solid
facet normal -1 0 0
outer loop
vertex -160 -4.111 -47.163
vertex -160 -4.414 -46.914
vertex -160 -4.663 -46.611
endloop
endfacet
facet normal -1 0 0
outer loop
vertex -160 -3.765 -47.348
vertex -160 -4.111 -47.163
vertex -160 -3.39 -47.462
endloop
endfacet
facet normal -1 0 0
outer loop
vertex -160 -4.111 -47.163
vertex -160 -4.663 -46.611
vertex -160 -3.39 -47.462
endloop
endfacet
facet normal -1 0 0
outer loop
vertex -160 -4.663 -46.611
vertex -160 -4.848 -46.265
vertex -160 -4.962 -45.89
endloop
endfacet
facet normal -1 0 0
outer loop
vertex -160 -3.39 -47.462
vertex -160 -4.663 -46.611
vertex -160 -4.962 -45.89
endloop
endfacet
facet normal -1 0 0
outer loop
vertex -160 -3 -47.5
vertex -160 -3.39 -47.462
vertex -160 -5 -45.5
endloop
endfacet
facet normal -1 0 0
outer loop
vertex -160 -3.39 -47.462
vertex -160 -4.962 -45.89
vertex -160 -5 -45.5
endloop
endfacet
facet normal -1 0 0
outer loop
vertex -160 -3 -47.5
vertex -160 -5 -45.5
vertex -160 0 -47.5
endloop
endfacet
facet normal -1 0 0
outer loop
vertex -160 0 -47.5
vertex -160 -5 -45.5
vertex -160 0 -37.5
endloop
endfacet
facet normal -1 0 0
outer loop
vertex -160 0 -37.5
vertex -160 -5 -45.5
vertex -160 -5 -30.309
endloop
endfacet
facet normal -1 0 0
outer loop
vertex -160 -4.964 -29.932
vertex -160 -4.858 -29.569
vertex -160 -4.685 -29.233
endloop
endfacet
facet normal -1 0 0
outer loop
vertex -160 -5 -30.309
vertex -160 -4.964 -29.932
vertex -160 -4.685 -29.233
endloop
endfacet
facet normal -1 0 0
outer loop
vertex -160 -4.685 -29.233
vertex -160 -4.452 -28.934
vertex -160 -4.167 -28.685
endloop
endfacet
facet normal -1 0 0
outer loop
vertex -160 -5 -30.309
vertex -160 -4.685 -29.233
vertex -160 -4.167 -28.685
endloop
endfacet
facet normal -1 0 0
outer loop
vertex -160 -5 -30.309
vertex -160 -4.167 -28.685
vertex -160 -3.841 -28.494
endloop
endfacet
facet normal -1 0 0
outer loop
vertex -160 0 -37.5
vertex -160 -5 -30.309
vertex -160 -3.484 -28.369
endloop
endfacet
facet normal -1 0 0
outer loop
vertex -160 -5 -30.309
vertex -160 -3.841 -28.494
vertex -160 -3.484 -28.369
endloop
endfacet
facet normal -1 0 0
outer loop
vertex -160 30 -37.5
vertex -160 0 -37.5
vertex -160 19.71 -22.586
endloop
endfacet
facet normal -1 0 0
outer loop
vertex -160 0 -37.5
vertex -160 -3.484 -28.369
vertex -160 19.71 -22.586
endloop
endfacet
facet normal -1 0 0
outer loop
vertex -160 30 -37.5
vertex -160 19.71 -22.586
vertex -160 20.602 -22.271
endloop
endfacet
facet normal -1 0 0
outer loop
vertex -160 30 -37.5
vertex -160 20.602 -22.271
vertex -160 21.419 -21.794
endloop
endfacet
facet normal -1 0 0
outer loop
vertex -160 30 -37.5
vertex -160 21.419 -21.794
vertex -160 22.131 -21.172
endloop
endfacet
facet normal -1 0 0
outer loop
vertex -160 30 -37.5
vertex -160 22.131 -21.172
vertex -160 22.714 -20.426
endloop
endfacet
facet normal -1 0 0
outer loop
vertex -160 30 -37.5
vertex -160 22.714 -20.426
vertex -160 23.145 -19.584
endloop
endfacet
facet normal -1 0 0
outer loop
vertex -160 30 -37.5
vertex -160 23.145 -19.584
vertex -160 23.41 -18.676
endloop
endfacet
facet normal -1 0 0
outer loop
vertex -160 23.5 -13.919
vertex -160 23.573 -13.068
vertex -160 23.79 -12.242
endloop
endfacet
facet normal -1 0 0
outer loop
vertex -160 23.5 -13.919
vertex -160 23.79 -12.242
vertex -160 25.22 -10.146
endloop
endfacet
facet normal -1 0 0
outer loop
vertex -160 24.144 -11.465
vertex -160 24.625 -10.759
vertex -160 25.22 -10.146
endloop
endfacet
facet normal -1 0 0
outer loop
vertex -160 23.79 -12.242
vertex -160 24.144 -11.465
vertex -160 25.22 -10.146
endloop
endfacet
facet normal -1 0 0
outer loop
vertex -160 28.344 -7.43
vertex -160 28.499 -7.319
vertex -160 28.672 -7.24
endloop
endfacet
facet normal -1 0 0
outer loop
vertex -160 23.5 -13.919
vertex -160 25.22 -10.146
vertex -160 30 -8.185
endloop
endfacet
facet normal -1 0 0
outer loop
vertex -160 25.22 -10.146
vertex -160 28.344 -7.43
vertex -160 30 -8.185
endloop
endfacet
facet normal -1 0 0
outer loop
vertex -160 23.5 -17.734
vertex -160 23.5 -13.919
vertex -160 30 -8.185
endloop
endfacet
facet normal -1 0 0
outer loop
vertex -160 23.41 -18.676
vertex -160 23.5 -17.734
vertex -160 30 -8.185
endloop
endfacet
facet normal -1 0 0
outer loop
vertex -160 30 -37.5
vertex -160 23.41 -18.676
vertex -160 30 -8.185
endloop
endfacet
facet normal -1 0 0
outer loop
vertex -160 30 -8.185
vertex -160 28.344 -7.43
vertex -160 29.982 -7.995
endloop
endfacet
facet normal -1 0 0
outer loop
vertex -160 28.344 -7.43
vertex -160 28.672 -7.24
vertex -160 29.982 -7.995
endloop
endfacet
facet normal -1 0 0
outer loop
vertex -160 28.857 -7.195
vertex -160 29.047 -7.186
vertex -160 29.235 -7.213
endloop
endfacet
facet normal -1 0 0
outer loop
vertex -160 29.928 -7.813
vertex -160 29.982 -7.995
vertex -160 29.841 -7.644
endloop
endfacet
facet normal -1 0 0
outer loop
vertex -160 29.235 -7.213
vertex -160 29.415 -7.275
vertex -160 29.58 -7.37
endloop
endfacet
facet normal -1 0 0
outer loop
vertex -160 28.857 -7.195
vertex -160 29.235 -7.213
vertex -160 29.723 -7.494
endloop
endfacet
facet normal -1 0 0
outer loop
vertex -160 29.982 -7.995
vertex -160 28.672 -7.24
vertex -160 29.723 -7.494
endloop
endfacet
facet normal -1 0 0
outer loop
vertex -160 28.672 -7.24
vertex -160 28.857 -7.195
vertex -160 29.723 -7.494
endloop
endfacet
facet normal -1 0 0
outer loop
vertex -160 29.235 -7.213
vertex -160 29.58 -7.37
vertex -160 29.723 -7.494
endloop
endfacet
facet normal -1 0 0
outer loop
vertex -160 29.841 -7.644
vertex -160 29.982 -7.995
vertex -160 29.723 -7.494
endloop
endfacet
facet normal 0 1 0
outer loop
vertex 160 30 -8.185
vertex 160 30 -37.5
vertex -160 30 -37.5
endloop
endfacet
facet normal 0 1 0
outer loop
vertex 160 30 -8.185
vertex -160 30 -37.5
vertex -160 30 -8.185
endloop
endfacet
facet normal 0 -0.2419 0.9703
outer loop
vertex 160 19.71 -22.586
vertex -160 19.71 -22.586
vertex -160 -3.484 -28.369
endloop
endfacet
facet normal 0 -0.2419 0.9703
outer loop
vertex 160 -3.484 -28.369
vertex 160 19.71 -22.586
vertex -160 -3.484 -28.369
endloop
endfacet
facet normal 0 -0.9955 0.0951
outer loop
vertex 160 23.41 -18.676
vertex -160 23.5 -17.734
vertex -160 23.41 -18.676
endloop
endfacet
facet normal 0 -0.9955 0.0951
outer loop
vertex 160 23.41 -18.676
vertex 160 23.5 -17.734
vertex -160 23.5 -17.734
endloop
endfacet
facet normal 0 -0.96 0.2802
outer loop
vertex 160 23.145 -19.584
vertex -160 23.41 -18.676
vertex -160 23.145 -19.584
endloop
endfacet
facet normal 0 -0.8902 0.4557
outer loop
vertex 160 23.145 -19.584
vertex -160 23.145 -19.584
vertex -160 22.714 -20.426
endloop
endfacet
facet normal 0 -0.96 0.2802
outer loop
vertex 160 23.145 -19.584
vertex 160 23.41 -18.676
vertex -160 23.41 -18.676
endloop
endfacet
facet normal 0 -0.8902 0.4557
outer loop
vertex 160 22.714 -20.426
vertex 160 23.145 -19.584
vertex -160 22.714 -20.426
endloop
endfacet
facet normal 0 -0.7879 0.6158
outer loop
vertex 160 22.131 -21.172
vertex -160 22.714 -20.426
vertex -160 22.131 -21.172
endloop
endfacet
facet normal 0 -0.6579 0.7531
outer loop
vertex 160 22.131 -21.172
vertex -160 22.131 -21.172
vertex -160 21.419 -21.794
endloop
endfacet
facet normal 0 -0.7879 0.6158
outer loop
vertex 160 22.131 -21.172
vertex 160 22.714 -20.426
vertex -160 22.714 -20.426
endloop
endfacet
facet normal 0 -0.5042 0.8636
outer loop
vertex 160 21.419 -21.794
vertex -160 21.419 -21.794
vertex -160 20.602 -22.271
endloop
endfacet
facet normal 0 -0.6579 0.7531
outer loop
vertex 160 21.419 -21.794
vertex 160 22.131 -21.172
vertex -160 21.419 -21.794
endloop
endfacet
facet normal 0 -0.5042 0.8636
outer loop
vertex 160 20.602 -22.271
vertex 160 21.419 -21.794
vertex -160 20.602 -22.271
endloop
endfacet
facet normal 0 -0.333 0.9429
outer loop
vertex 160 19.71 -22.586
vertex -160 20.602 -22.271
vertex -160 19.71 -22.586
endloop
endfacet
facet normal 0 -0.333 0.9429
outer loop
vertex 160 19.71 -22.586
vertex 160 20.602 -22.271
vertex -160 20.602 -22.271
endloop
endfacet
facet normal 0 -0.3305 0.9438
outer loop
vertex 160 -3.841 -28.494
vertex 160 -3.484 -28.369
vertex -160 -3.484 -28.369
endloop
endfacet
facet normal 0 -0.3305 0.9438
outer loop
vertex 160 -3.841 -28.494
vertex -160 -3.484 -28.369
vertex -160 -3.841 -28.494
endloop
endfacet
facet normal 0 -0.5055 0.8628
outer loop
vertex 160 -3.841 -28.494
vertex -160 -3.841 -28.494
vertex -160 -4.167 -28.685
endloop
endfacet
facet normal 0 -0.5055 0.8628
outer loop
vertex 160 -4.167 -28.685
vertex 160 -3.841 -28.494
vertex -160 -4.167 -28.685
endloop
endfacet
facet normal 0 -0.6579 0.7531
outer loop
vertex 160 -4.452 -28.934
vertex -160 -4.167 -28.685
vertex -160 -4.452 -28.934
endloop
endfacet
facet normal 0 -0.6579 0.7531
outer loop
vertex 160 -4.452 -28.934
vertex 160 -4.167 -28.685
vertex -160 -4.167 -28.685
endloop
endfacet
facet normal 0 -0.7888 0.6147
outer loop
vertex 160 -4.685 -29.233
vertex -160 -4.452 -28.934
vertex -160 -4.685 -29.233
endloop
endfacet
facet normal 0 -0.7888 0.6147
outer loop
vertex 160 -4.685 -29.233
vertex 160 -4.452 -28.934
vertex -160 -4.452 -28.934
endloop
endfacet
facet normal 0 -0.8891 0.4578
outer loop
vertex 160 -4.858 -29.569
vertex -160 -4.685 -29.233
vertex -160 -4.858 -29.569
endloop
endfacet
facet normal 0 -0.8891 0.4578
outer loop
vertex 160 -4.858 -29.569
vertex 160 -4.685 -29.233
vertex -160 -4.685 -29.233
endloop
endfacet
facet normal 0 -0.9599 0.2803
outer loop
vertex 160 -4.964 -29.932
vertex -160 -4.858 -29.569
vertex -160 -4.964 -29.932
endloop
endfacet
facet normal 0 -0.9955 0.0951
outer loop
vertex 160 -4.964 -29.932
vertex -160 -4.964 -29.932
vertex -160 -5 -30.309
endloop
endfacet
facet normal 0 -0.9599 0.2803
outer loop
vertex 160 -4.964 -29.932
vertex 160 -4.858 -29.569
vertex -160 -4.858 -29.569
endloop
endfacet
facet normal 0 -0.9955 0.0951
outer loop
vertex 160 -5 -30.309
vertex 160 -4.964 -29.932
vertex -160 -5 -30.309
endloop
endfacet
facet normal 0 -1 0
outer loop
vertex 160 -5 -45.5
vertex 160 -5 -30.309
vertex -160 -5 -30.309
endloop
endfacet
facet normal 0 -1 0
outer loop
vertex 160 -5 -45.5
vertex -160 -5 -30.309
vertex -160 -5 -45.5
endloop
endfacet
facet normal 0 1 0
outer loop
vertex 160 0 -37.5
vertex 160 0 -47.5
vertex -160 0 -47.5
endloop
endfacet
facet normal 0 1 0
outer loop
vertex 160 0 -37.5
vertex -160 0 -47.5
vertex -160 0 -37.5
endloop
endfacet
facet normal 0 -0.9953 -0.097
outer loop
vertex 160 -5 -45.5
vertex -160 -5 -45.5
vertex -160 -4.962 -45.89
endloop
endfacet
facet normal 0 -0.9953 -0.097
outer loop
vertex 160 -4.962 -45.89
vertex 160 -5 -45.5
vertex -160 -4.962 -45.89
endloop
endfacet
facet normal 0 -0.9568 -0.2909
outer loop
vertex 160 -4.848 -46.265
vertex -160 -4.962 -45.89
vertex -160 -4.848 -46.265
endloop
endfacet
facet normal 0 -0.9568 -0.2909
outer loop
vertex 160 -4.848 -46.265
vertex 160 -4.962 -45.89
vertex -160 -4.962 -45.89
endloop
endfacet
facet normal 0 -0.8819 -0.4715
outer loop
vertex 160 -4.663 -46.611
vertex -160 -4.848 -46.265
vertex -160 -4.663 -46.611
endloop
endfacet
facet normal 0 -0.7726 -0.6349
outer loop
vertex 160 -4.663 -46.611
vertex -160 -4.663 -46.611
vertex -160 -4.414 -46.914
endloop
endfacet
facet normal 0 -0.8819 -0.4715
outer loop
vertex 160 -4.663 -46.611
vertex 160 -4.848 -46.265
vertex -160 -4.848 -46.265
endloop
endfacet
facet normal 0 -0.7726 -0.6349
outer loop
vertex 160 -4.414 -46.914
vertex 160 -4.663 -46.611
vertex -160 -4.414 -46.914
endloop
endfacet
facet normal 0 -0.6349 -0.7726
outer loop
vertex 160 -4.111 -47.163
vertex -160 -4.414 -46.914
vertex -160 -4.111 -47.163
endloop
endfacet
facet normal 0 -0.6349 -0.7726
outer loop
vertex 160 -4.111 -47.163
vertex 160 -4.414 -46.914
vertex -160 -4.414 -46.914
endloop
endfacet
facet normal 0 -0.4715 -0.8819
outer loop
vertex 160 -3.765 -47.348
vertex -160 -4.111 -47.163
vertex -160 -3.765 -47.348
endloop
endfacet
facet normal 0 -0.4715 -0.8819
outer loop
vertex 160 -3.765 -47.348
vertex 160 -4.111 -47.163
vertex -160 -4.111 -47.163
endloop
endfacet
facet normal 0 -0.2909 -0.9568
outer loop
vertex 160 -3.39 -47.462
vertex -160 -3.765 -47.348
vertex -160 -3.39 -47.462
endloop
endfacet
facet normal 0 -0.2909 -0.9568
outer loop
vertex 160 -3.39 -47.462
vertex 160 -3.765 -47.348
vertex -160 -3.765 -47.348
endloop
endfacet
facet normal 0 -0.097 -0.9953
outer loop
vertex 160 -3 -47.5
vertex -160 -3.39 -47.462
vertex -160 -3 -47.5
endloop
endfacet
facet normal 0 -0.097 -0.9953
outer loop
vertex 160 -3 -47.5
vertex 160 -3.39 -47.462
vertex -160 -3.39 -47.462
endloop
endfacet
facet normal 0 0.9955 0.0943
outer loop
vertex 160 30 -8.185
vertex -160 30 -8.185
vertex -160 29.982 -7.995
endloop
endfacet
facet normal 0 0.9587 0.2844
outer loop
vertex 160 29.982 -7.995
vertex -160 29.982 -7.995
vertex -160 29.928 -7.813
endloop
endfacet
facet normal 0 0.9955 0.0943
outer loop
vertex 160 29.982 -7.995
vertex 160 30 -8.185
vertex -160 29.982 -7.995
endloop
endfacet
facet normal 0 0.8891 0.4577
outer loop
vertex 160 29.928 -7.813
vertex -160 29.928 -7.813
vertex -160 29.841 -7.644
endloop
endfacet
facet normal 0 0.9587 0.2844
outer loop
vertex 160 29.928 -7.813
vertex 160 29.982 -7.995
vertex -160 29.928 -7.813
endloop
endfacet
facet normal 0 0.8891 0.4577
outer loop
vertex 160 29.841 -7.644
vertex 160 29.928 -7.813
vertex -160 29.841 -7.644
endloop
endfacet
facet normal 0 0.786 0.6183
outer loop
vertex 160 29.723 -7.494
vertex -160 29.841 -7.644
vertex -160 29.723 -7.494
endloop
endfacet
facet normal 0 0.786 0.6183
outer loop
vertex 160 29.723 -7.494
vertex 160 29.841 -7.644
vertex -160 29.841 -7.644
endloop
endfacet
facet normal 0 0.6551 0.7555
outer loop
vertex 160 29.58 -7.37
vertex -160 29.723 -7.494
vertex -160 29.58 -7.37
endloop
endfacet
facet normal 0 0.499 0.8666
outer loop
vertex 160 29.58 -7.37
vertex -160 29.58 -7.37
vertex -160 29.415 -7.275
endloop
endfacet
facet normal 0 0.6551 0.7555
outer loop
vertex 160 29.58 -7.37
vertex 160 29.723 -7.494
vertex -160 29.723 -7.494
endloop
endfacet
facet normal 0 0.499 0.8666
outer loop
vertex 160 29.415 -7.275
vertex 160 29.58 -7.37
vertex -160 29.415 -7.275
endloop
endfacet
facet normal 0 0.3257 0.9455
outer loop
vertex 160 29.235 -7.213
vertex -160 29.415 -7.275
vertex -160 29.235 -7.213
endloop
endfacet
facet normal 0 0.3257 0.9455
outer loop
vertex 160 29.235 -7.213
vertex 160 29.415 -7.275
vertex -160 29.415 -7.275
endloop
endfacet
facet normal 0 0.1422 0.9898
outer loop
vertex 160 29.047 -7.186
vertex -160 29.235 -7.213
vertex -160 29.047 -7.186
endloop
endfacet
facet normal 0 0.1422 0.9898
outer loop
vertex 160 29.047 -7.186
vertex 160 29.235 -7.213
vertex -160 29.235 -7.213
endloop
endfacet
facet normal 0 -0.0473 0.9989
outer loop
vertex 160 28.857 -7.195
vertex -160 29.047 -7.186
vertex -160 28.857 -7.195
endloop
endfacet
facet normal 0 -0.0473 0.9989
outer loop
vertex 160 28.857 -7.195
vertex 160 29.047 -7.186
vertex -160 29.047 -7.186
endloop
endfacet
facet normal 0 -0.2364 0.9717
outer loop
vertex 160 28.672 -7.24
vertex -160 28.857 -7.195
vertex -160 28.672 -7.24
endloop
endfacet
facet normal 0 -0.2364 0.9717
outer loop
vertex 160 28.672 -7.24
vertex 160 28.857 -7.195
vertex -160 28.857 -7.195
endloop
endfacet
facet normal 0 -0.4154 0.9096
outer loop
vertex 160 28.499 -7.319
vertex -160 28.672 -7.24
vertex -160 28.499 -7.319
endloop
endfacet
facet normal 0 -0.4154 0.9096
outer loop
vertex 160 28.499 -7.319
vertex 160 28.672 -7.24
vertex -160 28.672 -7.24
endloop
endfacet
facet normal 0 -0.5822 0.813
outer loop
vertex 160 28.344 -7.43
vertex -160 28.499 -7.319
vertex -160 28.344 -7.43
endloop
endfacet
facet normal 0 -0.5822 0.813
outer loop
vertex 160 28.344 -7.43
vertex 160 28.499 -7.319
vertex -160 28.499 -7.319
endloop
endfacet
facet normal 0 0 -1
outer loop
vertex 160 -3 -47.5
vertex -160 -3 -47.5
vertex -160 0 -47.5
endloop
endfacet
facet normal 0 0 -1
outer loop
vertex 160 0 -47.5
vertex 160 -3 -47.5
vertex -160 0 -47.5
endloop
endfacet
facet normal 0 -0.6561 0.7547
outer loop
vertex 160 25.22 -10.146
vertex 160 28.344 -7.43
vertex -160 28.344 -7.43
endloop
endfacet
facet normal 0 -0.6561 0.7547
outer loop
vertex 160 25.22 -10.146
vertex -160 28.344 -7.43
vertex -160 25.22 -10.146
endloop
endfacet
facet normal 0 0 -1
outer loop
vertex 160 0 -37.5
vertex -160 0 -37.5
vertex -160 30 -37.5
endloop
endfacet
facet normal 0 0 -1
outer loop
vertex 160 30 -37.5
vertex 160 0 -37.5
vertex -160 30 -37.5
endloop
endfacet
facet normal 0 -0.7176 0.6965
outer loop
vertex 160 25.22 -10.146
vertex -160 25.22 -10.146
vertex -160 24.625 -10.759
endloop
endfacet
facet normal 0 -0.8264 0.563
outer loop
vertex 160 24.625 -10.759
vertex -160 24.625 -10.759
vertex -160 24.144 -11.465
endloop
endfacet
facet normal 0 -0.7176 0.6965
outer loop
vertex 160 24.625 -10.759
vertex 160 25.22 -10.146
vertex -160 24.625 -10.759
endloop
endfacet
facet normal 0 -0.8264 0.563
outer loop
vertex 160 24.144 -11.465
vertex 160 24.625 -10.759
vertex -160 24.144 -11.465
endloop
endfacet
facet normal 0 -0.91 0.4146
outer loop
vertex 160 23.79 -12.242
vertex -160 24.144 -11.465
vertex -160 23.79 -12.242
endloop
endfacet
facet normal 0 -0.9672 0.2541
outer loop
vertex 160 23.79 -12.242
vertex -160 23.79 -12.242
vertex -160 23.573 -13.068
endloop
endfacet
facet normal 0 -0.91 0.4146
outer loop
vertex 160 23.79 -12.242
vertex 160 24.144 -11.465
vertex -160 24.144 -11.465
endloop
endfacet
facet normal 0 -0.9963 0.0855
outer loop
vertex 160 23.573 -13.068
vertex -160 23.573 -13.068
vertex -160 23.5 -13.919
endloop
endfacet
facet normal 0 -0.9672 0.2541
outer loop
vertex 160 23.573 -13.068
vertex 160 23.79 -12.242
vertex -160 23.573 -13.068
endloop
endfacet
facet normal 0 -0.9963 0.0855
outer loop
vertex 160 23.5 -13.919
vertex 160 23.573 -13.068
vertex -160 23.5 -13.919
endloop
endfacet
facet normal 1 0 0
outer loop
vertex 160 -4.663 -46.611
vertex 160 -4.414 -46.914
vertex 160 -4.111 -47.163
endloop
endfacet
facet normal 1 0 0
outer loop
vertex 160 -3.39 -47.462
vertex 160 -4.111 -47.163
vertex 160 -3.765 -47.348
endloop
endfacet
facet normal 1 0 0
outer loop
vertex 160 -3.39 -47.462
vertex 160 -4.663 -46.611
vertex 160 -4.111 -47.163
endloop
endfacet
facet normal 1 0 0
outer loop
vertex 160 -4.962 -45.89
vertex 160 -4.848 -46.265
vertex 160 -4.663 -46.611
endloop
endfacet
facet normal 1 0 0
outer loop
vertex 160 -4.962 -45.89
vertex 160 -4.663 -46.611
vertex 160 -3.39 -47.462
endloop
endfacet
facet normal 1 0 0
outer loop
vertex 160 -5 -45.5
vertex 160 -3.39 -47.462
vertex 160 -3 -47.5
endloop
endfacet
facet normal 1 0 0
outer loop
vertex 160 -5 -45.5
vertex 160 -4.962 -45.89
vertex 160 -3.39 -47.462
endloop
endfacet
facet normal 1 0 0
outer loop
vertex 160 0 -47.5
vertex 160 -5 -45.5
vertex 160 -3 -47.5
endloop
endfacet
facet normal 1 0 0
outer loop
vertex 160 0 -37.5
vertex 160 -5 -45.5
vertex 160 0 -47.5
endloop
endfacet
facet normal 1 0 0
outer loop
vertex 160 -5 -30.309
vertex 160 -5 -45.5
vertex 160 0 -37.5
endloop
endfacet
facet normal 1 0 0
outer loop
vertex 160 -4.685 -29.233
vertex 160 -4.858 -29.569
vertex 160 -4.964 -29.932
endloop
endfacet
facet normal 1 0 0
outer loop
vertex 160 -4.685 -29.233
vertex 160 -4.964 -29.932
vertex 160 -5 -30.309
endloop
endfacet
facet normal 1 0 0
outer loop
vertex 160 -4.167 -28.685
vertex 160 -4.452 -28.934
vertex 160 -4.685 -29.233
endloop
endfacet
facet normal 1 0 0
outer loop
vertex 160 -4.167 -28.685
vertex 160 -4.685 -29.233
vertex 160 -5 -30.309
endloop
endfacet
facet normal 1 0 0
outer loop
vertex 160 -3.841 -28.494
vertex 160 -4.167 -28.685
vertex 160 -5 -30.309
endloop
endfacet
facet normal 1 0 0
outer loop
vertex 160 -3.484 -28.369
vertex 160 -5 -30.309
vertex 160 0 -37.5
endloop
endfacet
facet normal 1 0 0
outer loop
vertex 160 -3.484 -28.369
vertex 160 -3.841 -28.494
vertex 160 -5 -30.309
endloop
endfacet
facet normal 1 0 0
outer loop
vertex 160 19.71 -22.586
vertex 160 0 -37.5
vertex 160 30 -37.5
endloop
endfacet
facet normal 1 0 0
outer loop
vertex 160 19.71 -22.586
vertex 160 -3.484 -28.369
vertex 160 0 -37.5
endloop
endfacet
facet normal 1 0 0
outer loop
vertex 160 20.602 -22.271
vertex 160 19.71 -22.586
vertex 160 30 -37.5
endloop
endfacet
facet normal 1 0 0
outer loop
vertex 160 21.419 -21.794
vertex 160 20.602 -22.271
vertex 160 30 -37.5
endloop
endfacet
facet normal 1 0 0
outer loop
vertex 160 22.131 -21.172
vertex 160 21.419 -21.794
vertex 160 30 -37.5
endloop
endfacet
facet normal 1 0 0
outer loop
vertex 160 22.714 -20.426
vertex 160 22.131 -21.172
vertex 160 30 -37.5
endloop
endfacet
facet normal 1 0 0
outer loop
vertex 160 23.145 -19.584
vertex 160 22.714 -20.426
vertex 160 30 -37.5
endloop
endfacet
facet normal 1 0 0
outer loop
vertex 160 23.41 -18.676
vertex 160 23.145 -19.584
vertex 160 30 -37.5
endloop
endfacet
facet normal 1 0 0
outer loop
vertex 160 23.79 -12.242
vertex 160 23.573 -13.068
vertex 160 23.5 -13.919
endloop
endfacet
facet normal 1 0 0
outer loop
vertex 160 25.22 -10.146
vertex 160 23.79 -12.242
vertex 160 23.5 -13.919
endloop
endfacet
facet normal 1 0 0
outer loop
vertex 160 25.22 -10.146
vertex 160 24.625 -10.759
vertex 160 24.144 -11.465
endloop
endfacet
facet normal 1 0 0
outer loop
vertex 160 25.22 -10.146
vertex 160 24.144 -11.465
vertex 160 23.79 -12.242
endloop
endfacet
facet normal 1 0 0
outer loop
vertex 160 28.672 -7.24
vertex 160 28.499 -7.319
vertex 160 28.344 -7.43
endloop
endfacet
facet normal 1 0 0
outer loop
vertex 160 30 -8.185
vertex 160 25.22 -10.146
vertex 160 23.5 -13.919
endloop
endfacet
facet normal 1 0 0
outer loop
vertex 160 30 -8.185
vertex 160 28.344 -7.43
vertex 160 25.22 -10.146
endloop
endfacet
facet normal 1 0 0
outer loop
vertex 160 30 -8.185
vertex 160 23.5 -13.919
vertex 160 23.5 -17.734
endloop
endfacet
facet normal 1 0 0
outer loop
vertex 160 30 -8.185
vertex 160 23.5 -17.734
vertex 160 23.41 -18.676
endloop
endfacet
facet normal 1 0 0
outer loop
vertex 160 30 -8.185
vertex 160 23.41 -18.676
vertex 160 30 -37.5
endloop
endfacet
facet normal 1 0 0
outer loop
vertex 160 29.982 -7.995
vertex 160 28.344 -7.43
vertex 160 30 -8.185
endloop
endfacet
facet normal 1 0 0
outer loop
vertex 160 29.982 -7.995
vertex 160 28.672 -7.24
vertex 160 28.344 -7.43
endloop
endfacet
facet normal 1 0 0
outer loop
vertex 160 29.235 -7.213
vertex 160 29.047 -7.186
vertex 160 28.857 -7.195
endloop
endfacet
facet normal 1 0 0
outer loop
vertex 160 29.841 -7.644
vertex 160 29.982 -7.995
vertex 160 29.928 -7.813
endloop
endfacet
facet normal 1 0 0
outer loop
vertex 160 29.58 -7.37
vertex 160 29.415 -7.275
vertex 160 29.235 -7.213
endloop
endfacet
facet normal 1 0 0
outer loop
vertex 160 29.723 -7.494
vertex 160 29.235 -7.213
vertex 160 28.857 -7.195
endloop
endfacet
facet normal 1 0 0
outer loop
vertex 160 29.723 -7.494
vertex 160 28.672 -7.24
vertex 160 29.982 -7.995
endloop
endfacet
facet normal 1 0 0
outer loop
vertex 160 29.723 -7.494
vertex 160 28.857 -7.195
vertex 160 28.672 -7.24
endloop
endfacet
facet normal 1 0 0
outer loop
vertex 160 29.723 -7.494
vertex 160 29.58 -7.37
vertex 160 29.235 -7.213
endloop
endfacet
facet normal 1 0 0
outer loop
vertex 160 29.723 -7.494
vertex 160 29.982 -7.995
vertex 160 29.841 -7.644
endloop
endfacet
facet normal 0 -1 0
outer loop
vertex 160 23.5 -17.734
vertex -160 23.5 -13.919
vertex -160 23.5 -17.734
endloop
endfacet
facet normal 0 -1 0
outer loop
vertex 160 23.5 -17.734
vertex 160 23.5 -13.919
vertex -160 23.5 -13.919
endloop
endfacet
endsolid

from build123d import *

# Parameters (mm, degrees)
F2_DEPTH = 160


with BuildPart() as f2:
    # F1 (on Right) → F2 (new body, symmetric)
    with BuildSketch(Plane.YZ):
        with BuildLine():
            Line((19.709609, -22.585842), (-3.483844, -28.36862))
            ThreePointArc((-3.483844, -28.36862), (-4.576022, -29.077888), (-5, -30.309211))
            Line((-5, -30.309211), (-5, -45.5))
            ThreePointArc((-5, -45.5), (-4.414214, -46.914214), (-3, -47.5))
            Line((-3, -47.5), (0, -47.5))
            Line((0, -47.5), (0, -37.5))
            Line((0, -37.5), (30, -37.5))
            Line((30, -37.5), (30, -8.184728))
            ThreePointArc((30, -8.184728), (29.414693, -7.274767), (28.343941, -7.430018))
            Line((28.343941, -7.430018), (25.219705, -10.145875))
            ThreePointArc((25.219705, -10.145875), (23.950194, -11.845957), (23.5, -13.919423))
            Line((23.5, -13.919423), (23.5, -17.734364))
            ThreePointArc((23.5, -17.734364), (22.440054, -20.812671), (19.709609, -22.585842))
        make_face()
    extrude(amount=F2_DEPTH, both=True)


solid = f2.part
